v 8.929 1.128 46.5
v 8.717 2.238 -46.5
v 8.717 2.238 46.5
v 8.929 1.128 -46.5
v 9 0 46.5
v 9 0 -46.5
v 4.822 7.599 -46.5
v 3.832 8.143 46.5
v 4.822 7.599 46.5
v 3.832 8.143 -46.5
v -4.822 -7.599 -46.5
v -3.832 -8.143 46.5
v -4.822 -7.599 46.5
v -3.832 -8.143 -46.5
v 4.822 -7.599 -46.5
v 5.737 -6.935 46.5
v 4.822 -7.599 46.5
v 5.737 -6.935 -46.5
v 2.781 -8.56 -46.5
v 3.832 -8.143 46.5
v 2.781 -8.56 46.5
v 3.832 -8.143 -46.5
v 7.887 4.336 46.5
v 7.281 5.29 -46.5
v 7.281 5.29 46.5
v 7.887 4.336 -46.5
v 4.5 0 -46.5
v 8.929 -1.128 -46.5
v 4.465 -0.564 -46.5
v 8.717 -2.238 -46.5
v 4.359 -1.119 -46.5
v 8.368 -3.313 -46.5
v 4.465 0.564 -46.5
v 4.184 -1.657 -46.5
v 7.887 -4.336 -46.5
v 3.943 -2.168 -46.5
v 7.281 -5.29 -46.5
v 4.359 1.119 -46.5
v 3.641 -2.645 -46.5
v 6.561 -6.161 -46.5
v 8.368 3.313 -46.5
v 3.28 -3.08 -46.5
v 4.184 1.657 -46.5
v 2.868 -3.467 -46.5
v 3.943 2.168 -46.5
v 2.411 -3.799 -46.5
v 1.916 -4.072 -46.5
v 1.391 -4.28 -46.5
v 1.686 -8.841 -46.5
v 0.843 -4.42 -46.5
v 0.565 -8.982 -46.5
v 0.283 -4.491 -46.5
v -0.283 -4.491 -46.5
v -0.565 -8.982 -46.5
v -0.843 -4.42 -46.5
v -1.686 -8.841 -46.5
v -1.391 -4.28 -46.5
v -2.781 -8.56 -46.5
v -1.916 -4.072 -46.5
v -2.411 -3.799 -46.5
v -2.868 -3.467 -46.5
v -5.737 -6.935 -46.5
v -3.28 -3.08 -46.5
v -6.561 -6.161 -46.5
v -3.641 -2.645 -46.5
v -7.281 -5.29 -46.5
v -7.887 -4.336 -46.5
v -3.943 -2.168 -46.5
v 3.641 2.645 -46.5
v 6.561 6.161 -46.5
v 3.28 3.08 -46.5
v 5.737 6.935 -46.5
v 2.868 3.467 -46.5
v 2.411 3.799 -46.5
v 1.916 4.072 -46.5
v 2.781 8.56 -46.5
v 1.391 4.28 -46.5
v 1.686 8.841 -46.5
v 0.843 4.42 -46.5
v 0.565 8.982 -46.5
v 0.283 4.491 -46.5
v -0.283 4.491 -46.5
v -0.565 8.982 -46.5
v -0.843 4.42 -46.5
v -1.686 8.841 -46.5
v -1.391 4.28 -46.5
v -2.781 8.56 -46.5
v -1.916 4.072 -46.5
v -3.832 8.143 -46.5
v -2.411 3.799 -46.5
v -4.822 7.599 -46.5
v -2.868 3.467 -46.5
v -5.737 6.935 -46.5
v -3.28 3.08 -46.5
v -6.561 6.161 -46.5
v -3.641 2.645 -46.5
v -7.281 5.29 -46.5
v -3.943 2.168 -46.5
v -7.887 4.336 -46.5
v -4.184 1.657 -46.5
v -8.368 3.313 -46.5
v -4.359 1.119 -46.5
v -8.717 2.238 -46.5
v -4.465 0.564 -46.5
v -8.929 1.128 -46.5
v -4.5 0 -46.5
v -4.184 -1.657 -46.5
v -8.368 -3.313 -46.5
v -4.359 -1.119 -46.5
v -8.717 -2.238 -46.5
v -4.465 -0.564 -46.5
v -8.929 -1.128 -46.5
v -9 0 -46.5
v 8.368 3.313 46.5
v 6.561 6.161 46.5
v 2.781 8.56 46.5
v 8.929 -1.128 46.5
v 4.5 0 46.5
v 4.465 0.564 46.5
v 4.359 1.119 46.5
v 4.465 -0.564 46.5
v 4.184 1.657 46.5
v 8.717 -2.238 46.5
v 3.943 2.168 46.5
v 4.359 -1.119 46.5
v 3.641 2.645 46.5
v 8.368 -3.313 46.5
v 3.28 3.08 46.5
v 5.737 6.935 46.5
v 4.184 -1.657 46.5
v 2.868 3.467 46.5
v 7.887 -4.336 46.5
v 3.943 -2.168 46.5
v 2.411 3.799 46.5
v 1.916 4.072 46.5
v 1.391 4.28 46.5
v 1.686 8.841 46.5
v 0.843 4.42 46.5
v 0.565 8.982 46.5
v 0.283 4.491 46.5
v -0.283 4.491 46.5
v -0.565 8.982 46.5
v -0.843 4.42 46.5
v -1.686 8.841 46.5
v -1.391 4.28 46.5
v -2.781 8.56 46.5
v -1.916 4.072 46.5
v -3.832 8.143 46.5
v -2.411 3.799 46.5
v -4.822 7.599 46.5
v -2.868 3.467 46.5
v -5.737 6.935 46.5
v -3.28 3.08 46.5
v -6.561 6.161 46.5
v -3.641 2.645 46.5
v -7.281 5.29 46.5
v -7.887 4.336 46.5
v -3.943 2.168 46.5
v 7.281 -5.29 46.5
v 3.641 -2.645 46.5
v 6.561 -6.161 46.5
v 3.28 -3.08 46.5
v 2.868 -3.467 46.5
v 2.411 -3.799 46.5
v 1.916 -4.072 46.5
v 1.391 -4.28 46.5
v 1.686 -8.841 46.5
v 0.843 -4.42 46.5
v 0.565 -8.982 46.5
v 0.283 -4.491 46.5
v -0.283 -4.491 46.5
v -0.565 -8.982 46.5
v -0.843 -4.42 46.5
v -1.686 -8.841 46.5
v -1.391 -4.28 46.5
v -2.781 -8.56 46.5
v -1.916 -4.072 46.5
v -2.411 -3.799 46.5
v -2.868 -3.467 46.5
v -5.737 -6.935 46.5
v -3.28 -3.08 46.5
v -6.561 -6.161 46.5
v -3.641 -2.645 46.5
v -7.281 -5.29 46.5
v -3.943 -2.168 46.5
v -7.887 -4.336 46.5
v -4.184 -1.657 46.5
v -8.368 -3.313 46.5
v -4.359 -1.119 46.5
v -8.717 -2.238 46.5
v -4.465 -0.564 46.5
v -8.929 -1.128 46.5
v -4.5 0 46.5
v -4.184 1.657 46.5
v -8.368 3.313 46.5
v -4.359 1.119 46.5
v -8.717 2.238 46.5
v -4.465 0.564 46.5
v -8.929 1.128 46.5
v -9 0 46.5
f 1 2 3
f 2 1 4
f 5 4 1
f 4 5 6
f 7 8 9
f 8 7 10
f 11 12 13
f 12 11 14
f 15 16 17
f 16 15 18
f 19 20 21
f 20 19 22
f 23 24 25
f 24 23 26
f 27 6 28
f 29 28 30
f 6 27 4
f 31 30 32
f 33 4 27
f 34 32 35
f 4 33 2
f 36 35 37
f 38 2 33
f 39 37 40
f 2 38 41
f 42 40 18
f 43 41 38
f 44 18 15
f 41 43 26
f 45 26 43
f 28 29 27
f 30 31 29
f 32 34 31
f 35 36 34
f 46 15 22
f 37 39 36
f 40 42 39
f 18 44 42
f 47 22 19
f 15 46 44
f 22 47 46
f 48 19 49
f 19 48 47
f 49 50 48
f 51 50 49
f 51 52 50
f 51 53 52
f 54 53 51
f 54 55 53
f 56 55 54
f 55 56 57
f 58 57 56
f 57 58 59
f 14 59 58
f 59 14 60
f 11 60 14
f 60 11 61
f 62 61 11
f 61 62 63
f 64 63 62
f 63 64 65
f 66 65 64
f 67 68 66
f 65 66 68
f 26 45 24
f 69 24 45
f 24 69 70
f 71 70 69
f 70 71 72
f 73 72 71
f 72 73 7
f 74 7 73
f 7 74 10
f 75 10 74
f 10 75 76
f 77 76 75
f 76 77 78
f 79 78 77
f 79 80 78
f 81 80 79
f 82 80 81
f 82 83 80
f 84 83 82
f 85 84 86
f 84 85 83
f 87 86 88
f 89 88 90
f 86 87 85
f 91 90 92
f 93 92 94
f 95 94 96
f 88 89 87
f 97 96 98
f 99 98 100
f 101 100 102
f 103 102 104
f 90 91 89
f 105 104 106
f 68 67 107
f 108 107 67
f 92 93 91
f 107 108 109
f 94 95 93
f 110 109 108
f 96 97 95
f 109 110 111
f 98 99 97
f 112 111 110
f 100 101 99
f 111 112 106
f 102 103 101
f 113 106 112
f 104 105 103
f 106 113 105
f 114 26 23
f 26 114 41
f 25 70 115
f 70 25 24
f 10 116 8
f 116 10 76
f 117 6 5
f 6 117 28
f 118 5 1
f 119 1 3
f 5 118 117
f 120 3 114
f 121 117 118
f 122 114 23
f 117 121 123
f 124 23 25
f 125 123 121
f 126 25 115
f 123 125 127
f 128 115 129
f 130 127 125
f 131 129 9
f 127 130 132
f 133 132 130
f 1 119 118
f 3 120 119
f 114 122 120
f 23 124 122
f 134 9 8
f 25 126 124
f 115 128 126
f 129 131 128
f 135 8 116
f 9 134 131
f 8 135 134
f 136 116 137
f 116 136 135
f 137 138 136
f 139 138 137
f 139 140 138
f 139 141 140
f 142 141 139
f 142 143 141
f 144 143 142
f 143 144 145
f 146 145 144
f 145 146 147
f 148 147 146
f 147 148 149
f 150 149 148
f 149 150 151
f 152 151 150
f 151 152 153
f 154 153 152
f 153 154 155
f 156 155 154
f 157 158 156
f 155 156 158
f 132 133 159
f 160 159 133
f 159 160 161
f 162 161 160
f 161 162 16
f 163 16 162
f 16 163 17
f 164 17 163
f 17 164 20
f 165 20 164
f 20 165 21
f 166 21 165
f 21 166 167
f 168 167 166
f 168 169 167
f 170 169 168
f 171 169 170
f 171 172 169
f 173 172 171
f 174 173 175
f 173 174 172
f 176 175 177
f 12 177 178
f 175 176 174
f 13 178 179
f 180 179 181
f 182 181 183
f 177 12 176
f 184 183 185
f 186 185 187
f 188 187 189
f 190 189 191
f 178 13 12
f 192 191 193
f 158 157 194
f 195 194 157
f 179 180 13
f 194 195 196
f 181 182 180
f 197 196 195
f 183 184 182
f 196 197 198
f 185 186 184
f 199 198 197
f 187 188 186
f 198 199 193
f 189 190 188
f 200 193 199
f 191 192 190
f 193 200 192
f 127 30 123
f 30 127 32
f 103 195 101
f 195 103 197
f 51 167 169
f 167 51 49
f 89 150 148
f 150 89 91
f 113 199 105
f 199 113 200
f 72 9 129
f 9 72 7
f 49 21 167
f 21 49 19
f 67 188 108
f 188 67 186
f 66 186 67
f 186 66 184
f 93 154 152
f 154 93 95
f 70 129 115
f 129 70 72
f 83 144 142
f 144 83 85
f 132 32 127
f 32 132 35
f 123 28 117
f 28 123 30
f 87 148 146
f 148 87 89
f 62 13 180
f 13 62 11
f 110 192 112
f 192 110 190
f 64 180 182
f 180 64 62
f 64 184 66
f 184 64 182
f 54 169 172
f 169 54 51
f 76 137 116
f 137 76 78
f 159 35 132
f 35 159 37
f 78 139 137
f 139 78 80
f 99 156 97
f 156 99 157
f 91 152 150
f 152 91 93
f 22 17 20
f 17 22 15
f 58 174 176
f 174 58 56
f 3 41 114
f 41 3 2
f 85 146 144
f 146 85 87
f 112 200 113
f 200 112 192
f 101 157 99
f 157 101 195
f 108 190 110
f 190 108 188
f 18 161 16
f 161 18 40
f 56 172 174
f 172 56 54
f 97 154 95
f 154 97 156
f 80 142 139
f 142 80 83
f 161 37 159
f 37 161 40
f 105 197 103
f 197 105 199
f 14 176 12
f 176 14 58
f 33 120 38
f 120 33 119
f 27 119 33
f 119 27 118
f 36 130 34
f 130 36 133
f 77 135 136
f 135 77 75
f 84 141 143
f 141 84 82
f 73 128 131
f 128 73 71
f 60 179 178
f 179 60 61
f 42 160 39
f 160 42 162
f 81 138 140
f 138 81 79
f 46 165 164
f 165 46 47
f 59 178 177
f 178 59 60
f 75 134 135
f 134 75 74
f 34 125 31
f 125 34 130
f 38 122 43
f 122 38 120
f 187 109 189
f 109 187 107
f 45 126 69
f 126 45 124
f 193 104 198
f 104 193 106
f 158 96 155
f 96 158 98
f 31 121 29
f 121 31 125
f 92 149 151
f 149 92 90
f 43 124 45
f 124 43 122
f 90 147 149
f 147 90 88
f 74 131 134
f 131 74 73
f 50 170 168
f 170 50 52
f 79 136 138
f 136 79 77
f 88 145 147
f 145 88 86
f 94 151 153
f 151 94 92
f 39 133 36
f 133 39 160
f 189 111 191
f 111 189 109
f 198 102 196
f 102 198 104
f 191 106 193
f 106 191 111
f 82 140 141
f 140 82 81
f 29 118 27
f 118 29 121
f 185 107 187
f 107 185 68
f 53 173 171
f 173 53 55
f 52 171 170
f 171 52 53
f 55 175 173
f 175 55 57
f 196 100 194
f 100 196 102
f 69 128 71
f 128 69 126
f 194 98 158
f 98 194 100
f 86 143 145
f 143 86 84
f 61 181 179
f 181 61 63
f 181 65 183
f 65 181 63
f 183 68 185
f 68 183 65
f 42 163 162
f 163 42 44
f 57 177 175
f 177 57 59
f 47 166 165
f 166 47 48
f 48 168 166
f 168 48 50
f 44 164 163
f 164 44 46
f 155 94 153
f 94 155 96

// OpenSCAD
$fn = 50;


difference() {
	union() {
		translate(v = [0, 0, -46.5000000000]) {
			cylinder(h = 93, r = 9.0000000000);
		}
	}
	union() {
		translate(v = [0, 0, -100.0000000000]) {
			cylinder(h = 200, r = 4.5000000000);
		}
	}
}
